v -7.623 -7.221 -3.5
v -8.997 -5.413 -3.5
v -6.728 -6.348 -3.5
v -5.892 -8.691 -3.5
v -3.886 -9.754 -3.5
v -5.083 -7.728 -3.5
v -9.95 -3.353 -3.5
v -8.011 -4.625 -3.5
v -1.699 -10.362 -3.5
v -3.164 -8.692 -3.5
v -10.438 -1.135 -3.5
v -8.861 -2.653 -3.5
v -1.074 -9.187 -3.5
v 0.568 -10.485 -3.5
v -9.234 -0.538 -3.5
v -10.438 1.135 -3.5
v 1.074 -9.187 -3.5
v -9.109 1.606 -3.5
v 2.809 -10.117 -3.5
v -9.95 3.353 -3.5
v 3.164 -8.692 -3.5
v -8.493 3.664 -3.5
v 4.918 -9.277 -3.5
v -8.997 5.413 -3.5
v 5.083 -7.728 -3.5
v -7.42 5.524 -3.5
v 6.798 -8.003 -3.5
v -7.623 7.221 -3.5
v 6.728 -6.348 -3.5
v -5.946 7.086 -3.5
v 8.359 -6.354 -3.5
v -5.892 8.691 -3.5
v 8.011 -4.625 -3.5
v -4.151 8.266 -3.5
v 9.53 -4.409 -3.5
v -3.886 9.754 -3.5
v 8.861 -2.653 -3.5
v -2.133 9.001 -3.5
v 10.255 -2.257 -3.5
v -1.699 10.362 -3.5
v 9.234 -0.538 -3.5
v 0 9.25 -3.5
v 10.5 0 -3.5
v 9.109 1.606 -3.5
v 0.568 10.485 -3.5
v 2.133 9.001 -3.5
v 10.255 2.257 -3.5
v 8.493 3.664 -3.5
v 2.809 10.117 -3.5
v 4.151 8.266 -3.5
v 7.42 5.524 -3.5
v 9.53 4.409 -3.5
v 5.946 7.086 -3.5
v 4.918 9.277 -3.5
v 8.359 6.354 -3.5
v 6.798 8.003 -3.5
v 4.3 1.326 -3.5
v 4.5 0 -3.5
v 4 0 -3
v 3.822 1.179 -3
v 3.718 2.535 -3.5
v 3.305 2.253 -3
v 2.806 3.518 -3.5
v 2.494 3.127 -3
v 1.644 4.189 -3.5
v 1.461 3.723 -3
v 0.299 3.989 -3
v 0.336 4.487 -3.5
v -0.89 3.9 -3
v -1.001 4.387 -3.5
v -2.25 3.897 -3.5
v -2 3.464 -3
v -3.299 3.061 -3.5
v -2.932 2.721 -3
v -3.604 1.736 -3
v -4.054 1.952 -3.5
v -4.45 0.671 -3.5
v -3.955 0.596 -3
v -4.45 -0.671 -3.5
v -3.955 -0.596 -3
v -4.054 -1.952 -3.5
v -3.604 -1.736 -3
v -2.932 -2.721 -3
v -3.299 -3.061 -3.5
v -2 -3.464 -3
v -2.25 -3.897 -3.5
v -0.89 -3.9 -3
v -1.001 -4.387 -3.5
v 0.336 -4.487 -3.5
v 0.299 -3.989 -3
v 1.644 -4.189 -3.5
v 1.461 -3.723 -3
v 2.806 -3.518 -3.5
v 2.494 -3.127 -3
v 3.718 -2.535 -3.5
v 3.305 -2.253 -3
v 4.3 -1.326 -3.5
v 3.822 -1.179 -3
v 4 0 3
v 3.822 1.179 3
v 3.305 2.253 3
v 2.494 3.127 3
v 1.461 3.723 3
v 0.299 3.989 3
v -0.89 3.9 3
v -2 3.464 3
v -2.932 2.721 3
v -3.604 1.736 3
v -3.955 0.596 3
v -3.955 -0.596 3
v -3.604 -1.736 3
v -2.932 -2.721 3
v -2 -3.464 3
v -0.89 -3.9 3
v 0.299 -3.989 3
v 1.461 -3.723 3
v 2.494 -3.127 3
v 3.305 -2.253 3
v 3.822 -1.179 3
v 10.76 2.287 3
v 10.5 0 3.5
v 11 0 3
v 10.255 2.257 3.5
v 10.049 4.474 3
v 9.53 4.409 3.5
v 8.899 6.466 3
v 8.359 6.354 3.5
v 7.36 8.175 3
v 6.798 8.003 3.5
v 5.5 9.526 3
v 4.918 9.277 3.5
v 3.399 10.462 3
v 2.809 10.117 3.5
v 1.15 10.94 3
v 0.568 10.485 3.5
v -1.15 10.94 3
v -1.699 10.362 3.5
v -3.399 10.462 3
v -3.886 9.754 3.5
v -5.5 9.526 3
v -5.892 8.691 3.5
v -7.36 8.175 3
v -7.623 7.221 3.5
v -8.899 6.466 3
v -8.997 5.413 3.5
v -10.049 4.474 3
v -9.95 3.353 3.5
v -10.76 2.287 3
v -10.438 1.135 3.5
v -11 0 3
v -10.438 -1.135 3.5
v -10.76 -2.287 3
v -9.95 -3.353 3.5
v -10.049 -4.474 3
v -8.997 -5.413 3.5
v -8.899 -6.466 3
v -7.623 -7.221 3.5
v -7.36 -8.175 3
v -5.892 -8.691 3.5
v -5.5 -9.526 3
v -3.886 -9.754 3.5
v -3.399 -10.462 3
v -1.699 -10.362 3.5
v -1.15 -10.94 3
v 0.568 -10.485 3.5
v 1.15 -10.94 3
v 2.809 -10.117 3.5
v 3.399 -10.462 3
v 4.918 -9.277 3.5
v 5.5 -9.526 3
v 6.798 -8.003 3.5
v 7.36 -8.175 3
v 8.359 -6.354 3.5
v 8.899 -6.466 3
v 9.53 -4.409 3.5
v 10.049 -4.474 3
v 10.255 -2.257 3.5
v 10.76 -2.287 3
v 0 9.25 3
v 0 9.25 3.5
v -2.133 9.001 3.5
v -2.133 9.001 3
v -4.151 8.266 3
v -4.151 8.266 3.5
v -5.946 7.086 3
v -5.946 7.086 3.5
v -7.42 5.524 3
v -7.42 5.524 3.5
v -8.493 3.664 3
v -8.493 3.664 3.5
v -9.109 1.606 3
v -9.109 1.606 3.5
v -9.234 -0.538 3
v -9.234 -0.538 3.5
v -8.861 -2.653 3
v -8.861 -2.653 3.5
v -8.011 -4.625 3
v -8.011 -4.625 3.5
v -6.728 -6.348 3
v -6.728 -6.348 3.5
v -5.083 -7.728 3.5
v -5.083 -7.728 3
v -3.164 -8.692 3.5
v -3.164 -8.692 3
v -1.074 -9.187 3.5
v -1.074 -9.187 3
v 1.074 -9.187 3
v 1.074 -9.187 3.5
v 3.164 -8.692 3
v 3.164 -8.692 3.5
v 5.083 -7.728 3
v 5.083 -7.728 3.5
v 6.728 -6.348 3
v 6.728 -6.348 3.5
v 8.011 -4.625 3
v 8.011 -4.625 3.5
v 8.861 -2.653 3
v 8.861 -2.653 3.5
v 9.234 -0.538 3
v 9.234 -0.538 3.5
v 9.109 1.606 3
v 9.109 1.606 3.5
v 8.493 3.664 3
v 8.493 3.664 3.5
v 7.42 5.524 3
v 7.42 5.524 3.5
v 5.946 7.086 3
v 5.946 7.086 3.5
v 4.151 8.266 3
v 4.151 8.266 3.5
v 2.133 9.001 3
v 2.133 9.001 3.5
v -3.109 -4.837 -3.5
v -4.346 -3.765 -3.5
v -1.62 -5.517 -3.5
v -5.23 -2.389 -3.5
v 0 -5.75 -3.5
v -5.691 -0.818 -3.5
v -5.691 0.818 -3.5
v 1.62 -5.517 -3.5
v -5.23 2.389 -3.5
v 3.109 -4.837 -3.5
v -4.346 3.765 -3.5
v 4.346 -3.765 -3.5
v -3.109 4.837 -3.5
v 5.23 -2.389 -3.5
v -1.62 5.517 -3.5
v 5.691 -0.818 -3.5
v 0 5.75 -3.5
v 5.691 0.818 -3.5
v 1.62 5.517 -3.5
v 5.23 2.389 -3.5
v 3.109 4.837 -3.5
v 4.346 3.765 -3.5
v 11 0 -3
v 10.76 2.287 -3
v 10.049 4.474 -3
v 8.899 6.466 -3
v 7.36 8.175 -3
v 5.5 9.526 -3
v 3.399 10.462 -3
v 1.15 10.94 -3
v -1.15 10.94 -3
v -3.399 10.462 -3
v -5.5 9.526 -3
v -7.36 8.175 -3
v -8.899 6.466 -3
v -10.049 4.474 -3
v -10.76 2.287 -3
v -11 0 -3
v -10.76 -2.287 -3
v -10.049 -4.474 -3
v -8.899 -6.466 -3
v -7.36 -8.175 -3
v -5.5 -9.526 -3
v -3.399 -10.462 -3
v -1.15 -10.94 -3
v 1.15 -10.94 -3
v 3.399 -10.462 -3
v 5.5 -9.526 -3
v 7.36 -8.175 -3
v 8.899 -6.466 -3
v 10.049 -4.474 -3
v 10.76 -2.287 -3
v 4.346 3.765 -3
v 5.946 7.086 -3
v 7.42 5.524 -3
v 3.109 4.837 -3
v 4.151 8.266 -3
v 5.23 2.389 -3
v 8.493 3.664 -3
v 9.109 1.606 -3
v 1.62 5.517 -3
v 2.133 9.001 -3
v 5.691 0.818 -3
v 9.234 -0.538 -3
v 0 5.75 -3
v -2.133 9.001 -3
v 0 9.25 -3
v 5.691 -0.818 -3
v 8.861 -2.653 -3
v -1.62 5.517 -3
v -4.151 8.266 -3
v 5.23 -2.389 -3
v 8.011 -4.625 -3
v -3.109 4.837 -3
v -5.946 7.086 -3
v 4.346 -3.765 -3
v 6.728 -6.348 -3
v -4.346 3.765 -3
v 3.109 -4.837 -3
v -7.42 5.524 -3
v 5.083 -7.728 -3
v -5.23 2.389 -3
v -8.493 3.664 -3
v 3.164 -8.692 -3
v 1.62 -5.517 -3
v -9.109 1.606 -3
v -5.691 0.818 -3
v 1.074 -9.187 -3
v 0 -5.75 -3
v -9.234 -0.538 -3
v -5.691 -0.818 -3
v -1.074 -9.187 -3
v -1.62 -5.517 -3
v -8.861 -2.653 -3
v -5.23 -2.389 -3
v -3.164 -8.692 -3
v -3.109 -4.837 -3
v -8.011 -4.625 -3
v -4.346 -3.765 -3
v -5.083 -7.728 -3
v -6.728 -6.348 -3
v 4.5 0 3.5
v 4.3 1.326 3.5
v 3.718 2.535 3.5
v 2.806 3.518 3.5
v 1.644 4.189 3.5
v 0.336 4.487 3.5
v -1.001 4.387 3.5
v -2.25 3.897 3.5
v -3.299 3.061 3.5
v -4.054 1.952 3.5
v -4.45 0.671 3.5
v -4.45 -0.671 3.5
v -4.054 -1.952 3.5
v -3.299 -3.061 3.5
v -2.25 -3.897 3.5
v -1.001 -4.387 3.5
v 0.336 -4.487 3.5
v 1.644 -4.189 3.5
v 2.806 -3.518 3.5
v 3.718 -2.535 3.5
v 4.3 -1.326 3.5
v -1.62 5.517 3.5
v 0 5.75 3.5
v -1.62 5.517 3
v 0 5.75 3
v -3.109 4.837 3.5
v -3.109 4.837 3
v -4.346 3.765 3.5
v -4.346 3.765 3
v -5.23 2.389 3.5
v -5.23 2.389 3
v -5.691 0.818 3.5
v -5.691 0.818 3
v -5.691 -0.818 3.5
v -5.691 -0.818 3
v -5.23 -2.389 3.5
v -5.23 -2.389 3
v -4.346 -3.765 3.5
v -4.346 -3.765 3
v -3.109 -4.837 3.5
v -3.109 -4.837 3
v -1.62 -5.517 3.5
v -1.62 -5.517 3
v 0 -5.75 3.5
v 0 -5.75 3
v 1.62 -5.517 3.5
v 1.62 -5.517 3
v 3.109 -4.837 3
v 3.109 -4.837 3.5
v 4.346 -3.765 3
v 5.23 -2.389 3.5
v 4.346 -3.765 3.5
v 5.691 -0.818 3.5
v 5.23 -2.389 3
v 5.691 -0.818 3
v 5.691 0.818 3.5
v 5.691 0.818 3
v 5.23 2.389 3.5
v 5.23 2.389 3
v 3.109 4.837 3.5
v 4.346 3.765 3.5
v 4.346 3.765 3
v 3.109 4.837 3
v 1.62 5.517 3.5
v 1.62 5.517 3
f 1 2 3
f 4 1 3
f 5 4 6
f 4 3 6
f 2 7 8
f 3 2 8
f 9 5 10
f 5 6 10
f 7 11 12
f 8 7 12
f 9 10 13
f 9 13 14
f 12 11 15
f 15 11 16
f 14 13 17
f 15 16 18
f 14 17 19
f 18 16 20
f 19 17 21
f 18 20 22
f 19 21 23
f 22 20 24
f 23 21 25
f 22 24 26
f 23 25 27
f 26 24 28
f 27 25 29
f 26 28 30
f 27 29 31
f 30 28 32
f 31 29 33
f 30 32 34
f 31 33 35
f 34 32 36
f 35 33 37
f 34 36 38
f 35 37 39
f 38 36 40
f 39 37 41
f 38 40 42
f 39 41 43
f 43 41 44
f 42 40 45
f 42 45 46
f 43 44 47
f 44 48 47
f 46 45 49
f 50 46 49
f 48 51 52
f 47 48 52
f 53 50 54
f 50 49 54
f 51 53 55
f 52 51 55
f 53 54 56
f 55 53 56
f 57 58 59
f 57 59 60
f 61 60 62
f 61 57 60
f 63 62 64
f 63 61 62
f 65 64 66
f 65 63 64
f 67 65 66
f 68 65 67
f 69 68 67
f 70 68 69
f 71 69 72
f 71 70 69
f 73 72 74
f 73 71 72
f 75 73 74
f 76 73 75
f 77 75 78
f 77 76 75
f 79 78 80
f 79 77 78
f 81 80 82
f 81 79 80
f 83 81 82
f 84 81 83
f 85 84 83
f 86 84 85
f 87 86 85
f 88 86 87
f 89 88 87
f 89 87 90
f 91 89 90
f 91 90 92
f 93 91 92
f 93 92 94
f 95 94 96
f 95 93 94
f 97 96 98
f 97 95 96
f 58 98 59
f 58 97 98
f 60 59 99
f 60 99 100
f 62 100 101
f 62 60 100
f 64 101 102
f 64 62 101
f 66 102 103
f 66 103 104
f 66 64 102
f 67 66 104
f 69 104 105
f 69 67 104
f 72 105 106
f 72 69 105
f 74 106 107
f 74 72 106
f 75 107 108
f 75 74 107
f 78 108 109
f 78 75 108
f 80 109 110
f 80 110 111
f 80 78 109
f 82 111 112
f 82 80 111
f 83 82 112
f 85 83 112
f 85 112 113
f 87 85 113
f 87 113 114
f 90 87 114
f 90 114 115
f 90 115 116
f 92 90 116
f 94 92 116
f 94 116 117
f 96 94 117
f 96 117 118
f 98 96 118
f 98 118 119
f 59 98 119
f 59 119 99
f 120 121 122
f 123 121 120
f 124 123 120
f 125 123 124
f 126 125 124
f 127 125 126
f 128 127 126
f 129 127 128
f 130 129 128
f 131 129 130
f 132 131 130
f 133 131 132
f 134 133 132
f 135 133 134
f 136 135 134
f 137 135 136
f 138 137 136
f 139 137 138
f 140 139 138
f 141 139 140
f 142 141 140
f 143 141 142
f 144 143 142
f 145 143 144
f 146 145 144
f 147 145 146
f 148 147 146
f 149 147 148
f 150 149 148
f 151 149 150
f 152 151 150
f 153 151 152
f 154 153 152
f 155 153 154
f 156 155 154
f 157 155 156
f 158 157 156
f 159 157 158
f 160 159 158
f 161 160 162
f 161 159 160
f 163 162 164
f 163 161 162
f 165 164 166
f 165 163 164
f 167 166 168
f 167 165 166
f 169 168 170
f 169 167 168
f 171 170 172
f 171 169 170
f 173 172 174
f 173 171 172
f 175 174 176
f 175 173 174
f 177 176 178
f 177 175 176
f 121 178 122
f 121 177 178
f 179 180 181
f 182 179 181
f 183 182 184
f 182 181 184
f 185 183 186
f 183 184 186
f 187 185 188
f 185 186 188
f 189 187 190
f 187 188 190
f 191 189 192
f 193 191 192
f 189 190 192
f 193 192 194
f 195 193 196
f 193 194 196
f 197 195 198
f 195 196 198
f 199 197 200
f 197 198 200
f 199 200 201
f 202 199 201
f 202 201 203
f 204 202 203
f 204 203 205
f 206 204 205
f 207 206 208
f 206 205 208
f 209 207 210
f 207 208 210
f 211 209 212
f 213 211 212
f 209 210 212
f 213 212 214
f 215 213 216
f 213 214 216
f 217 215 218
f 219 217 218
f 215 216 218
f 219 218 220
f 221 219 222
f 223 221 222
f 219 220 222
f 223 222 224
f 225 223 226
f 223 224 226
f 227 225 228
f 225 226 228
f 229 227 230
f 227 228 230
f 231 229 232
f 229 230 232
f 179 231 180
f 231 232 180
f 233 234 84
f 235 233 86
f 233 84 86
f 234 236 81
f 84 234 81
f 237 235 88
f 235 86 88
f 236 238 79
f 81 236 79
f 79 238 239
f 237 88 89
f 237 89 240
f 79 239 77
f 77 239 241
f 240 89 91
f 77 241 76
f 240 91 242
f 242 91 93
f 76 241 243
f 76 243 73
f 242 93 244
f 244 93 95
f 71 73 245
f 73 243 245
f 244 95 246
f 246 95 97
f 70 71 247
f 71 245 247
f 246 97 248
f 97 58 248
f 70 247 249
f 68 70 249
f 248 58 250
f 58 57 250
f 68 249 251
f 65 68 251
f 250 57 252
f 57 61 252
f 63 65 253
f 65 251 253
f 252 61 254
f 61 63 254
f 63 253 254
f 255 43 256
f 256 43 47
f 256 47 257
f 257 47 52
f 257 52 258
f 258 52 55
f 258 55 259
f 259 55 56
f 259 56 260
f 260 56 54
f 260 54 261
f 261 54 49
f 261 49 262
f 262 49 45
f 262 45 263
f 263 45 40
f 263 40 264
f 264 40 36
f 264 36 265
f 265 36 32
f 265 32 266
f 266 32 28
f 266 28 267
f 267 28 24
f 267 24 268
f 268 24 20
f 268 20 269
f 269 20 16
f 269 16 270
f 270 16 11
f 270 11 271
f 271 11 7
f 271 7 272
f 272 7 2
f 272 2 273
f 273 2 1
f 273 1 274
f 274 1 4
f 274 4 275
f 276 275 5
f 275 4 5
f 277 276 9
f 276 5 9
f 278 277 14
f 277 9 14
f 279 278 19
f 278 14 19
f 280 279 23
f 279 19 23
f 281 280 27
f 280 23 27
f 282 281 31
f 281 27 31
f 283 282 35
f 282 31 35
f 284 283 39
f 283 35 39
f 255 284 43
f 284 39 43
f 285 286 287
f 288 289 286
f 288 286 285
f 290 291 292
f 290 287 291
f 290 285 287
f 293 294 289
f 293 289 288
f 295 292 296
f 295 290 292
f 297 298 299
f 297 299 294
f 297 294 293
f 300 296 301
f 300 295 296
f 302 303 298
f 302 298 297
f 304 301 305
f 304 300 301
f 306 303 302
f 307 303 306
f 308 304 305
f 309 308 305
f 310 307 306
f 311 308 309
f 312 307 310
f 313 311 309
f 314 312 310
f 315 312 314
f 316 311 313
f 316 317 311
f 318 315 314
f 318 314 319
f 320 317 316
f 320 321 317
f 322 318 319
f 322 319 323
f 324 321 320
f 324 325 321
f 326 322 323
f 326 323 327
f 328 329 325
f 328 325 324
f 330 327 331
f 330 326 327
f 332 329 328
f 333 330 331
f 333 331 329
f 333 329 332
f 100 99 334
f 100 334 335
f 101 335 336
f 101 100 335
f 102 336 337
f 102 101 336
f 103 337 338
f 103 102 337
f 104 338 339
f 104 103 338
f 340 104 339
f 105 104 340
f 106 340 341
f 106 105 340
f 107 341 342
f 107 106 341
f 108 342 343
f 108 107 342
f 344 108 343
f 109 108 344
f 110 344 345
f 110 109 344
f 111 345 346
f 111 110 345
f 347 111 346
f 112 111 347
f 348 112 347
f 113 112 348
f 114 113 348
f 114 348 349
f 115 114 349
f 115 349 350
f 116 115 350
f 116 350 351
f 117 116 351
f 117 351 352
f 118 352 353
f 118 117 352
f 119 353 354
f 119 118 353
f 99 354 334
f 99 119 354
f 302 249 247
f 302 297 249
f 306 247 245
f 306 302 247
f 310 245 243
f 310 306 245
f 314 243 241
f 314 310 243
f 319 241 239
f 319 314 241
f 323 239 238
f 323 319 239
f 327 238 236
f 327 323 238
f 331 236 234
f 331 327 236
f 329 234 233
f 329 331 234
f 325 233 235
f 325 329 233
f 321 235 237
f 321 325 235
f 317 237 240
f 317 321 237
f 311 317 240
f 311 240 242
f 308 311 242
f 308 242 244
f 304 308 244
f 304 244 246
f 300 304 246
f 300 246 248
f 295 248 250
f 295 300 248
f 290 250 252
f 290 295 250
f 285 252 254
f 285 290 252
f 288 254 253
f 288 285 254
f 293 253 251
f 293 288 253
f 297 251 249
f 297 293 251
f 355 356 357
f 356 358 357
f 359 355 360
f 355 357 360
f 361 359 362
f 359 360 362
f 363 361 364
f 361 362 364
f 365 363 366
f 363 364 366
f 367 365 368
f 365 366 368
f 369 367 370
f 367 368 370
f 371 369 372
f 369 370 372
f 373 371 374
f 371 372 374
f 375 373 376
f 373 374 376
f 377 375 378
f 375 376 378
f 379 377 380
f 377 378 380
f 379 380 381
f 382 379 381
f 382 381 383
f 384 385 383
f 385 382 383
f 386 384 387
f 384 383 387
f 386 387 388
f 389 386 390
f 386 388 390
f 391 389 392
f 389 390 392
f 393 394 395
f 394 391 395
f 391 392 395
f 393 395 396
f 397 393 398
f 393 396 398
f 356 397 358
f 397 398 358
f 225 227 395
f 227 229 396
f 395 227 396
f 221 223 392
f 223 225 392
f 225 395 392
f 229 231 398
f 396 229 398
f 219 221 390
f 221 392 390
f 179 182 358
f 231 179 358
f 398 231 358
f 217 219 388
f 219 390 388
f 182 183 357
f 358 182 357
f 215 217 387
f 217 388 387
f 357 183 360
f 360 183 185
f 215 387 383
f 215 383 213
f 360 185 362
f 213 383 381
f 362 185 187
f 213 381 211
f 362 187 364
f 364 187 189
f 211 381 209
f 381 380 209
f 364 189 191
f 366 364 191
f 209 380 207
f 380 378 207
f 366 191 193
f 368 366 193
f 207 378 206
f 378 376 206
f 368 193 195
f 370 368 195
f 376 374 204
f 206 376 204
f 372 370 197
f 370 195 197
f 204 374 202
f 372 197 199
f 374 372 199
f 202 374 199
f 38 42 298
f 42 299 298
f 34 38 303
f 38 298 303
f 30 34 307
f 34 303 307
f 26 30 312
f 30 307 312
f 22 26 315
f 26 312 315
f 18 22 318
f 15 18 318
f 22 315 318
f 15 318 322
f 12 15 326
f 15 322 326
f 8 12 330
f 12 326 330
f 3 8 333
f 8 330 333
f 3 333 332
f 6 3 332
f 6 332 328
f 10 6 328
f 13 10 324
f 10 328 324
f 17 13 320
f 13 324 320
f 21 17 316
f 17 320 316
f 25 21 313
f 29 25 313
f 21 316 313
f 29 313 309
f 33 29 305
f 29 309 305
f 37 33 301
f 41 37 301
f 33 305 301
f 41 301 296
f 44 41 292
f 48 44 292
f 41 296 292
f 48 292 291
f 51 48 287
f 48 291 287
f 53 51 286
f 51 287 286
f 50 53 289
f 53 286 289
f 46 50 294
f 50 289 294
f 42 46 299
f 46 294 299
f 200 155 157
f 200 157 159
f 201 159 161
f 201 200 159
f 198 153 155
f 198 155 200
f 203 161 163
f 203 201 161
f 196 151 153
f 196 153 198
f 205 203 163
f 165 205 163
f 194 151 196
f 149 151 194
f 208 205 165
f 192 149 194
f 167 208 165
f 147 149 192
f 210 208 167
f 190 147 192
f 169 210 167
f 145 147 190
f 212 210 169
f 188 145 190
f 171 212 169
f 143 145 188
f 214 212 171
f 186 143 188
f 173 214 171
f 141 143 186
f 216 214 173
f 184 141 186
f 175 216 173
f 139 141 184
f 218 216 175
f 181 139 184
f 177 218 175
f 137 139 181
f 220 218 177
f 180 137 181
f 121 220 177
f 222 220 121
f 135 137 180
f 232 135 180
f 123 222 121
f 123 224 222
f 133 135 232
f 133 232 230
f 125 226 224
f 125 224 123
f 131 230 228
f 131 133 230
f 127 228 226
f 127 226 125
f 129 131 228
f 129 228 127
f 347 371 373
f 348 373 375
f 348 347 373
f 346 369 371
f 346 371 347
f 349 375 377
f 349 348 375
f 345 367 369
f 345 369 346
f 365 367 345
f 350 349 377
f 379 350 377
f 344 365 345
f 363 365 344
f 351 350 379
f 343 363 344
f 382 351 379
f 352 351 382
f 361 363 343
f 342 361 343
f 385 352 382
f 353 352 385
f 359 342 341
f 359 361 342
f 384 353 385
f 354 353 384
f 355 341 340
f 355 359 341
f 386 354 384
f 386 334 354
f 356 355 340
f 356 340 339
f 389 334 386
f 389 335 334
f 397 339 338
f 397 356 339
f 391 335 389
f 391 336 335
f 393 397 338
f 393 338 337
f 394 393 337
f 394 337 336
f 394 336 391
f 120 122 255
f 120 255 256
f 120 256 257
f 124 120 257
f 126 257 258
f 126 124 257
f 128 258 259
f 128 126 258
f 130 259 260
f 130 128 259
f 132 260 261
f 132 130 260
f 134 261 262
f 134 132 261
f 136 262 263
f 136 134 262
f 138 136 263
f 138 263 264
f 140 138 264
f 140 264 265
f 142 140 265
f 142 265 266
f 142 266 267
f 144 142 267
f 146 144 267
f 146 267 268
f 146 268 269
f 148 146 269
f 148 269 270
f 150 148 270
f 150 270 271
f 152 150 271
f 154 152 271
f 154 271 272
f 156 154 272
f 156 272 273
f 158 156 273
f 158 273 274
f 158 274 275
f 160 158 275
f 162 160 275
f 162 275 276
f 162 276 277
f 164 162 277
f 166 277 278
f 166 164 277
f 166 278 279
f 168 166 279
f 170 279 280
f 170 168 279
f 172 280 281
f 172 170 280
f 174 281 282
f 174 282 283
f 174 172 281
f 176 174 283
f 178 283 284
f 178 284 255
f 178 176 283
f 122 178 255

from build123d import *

# Parameters (mm, degrees)
F0_R     = 11
F0_R_2   = 4
F1_DEPTH = 3.5
F2_SIZE  = 0.5
F3_W     = 3.5
F3_H     = 0.5
F3_H_2   = 1


with BuildPart() as f1:
    # F0 (on Top) → F1 (new body, symmetric)
    with BuildSketch(Plane.XY):
        Circle(F0_R)
        Circle(F0_R_2, mode=Mode.SUBTRACT)
    extrude(amount=F1_DEPTH, both=True)

    # F2
    f2_edges = [f1.edges().sort_by_distance(p)[0] for p in [
        (-11, 0, 3.5),
        (-11, 0, -3.5),
        (-4, 0, 3.5),
        (-4, 0, -3.5),
    ]]
    chamfer(f2_edges, length=F2_SIZE)

    # F3 (on Right) → F4 (revolve, cut)
    with BuildSketch(Plane.YZ):
        with Locations((7.5, 3.75)):
            Rectangle(F3_W, F3_H)
        with Locations((7.5, 3.25)):
            Rectangle(F3_W, F3_H)
        with Locations((7.5, -3.5)):
            Rectangle(F3_W, F3_H_2)
    revolve(axis=Axis((0, 0, 3.5), (0, 0, 1)), mode=Mode.SUBTRACT)


solid = f1.part
